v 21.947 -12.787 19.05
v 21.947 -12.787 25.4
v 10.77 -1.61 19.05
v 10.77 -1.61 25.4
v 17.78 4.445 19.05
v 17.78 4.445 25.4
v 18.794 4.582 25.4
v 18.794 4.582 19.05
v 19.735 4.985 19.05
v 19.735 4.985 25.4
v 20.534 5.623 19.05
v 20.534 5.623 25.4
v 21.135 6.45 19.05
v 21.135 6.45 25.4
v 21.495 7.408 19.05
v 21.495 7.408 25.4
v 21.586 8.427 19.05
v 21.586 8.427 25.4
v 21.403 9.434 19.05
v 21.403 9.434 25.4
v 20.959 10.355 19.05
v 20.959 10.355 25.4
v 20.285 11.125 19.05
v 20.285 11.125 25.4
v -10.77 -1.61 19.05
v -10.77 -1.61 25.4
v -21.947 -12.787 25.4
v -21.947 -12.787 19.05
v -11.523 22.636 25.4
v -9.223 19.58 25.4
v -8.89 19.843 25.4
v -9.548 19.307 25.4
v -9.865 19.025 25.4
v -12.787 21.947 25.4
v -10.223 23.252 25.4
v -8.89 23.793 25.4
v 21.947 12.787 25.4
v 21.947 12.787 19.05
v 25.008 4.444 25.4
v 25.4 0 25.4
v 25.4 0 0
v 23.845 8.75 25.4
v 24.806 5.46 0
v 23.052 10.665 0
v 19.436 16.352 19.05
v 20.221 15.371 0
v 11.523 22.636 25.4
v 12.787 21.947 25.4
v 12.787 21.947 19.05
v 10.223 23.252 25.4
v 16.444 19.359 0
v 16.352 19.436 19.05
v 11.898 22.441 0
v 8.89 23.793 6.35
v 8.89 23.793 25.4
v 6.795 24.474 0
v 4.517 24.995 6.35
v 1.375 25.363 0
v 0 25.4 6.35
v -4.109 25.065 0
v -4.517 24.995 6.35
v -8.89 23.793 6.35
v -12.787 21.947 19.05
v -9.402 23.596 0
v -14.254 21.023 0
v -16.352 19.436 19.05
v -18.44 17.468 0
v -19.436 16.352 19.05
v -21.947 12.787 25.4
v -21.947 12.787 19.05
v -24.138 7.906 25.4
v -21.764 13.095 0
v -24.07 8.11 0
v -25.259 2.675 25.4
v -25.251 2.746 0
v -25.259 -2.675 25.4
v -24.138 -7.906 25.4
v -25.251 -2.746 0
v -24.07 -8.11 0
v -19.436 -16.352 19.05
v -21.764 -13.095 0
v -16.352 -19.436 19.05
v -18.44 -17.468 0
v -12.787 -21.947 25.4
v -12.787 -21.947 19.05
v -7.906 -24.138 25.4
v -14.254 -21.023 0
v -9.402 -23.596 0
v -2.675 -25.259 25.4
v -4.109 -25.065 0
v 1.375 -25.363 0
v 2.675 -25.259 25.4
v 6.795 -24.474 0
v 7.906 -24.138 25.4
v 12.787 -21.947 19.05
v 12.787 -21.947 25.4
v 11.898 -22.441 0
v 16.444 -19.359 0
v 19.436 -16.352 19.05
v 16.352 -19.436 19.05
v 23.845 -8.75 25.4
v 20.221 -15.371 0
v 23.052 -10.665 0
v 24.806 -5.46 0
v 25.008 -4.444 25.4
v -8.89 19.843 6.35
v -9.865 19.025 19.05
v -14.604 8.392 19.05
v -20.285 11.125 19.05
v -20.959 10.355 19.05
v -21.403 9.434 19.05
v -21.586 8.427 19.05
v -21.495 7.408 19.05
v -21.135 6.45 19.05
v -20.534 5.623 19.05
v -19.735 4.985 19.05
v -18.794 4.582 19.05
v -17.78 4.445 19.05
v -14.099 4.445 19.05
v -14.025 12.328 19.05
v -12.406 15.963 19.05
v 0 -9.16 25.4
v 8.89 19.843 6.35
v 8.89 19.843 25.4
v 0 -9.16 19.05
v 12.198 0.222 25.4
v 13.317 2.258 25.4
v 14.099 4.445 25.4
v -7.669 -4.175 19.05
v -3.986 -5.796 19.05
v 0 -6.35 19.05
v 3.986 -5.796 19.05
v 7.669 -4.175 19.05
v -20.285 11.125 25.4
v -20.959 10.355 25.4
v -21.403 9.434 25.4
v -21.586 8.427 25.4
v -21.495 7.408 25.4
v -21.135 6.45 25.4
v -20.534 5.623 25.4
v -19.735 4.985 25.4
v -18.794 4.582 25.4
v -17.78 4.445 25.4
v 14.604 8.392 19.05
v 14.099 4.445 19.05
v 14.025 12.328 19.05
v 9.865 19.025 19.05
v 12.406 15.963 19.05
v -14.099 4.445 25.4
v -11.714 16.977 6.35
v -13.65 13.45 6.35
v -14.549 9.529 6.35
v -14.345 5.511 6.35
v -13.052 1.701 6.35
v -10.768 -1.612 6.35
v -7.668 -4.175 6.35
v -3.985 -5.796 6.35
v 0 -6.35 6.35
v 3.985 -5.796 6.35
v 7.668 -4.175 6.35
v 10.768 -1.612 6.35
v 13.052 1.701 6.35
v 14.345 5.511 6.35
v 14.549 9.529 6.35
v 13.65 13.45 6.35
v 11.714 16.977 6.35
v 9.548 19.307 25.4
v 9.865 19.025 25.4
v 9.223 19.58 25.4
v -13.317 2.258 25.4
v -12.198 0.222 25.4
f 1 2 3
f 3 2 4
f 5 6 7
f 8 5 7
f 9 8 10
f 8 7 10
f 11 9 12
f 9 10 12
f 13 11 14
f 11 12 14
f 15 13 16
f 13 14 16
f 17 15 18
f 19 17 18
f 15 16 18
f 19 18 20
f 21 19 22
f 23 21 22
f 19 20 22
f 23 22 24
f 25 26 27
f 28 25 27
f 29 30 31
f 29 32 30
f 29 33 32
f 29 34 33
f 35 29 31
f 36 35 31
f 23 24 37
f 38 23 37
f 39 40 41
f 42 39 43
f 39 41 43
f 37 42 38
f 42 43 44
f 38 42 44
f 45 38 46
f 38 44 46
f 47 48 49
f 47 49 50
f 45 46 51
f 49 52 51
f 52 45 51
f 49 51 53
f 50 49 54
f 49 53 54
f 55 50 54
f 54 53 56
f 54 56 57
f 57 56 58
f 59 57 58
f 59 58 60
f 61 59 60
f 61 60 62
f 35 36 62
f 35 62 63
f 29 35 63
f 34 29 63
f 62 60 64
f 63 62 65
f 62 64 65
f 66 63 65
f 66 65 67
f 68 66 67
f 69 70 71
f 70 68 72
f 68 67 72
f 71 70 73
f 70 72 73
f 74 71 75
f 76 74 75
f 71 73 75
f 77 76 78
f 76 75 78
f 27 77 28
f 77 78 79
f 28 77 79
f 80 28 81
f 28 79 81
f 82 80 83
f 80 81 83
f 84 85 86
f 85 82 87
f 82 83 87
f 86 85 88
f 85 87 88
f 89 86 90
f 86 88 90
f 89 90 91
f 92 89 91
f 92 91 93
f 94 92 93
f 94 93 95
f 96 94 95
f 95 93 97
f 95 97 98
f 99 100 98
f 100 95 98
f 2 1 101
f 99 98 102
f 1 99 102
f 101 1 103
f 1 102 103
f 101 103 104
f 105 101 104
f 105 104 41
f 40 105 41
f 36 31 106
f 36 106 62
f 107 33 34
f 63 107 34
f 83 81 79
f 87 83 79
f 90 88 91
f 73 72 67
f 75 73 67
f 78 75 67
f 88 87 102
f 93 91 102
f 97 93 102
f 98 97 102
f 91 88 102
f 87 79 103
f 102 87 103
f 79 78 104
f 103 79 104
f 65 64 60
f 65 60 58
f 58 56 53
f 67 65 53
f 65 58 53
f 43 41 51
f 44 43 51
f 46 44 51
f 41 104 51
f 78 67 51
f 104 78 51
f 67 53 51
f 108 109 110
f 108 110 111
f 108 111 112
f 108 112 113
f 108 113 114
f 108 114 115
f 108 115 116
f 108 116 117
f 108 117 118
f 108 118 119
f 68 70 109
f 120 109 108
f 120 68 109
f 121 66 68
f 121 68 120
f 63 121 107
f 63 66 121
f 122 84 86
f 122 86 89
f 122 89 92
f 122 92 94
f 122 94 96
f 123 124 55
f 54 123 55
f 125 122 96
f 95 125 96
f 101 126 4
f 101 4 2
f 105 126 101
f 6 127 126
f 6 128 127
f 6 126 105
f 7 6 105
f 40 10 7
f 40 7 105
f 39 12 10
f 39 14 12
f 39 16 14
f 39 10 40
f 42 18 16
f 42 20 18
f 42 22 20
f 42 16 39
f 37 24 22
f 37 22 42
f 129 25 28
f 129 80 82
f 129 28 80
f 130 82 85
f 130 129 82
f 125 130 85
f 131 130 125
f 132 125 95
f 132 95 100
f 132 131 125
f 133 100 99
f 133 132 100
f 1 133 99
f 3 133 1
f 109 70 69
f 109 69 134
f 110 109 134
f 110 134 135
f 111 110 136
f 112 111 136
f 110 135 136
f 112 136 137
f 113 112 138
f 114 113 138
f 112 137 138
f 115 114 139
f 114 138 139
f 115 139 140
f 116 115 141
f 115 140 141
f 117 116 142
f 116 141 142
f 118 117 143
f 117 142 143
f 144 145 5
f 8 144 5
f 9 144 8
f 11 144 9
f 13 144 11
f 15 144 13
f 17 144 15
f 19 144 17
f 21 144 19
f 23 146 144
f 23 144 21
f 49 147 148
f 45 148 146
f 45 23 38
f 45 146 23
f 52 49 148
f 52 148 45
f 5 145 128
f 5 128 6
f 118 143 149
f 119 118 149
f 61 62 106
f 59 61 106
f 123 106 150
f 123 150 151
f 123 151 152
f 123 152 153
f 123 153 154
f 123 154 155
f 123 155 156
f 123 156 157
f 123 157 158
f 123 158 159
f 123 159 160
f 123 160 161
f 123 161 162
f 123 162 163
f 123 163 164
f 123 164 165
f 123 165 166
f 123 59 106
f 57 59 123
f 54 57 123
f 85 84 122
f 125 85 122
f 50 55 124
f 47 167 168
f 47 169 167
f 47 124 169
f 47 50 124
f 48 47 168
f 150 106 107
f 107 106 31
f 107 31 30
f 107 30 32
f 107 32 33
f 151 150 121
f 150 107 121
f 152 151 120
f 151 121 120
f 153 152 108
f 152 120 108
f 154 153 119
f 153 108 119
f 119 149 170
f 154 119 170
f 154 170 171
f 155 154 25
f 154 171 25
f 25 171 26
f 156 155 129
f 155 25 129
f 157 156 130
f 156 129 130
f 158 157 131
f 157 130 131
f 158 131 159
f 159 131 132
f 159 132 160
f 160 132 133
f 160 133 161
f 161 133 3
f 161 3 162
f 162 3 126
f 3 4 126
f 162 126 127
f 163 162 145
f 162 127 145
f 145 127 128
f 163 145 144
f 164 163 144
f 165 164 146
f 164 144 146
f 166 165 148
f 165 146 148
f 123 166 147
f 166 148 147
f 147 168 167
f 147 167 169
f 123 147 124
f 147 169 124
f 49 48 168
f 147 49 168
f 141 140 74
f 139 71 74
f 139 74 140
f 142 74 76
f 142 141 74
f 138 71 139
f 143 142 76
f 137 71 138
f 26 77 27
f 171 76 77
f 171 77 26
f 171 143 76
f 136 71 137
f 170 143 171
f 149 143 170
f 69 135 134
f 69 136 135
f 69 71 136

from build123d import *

# Parameters (mm, degrees)
F0_R      = 25.4
F1_DEPTH  = 25.4
F2_R      = 14.605
F3_DEPTH  = 19.05
F4_W      = 7.62
F4_H      = 3.81
F5_DEPTH  = 25.401
F8_DEPTH  = 6.35
F9_W      = 17.78
F9_H      = 6.827337
F10_DEPTH = 19.05
F12_DEPTH = 6.35


with BuildPart() as f1:
    # F0 (on Top) → F1 (new body)
    with BuildSketch(Plane.XY):
        Circle(F0_R)
    extrude(amount=F1_DEPTH)

    # F2 (on face) → F3 (cut)
    with BuildSketch(Plane.XY.offset(25.4)):
        with Locations((0, 8.255)):
            Circle(F2_R)
    extrude(amount=-F3_DEPTH, mode=Mode.SUBTRACT)

    # F4 (on Front) → F5 (cut, through all)
    with BuildSketch(Plane.XZ):
        with Locations((0, 23.495)):
            Rectangle(F4_W, F4_H)
    extrude(amount=-F5_DEPTH, mode=Mode.SUBTRACT)

    # F7 (on face) → F8 (cut)
    with BuildSketch(Plane.XY.offset(25.4)):
        Polygon((17.960513, 27.120372), (0, 9.159861), (-17.960512, 27.120374), (-27.120373, 17.960513), (-9.159862, 0), (-27.120374, -17.960511), (-17.960513, -27.120372), (0, -9.159861), (17.960512, -27.120374), (27.120373, -17.960513), (9.159862, 0), (27.120374, 17.960511), align=None)
    extrude(amount=-F8_DEPTH, mode=Mode.SUBTRACT)

    # F9 (on face) → F10 (cut, through all)
    with BuildSketch(Plane.XY.offset(25.4)):
        with Locations((0, 23.256331)):
            Rectangle(F9_W, F9_H)
    extrude(amount=-F10_DEPTH, mode=Mode.SUBTRACT)

    # F11 (on face) → F12 (cut, through all)
    with BuildSketch(Plane.XY.offset(25.4)):
        with BuildLine():
            Line((17.78, 12.065), (-17.78, 12.065))
            ThreePointArc((-17.78, 12.065), (-21.59, 8.255), (-17.78, 4.445))
            Line((-17.78, 4.445), (17.78, 4.445))
            ThreePointArc((17.78, 4.445), (21.59, 8.255), (17.78, 12.065))
        make_face()
    extrude(amount=-F12_DEPTH, mode=Mode.SUBTRACT)


solid = f1.part
